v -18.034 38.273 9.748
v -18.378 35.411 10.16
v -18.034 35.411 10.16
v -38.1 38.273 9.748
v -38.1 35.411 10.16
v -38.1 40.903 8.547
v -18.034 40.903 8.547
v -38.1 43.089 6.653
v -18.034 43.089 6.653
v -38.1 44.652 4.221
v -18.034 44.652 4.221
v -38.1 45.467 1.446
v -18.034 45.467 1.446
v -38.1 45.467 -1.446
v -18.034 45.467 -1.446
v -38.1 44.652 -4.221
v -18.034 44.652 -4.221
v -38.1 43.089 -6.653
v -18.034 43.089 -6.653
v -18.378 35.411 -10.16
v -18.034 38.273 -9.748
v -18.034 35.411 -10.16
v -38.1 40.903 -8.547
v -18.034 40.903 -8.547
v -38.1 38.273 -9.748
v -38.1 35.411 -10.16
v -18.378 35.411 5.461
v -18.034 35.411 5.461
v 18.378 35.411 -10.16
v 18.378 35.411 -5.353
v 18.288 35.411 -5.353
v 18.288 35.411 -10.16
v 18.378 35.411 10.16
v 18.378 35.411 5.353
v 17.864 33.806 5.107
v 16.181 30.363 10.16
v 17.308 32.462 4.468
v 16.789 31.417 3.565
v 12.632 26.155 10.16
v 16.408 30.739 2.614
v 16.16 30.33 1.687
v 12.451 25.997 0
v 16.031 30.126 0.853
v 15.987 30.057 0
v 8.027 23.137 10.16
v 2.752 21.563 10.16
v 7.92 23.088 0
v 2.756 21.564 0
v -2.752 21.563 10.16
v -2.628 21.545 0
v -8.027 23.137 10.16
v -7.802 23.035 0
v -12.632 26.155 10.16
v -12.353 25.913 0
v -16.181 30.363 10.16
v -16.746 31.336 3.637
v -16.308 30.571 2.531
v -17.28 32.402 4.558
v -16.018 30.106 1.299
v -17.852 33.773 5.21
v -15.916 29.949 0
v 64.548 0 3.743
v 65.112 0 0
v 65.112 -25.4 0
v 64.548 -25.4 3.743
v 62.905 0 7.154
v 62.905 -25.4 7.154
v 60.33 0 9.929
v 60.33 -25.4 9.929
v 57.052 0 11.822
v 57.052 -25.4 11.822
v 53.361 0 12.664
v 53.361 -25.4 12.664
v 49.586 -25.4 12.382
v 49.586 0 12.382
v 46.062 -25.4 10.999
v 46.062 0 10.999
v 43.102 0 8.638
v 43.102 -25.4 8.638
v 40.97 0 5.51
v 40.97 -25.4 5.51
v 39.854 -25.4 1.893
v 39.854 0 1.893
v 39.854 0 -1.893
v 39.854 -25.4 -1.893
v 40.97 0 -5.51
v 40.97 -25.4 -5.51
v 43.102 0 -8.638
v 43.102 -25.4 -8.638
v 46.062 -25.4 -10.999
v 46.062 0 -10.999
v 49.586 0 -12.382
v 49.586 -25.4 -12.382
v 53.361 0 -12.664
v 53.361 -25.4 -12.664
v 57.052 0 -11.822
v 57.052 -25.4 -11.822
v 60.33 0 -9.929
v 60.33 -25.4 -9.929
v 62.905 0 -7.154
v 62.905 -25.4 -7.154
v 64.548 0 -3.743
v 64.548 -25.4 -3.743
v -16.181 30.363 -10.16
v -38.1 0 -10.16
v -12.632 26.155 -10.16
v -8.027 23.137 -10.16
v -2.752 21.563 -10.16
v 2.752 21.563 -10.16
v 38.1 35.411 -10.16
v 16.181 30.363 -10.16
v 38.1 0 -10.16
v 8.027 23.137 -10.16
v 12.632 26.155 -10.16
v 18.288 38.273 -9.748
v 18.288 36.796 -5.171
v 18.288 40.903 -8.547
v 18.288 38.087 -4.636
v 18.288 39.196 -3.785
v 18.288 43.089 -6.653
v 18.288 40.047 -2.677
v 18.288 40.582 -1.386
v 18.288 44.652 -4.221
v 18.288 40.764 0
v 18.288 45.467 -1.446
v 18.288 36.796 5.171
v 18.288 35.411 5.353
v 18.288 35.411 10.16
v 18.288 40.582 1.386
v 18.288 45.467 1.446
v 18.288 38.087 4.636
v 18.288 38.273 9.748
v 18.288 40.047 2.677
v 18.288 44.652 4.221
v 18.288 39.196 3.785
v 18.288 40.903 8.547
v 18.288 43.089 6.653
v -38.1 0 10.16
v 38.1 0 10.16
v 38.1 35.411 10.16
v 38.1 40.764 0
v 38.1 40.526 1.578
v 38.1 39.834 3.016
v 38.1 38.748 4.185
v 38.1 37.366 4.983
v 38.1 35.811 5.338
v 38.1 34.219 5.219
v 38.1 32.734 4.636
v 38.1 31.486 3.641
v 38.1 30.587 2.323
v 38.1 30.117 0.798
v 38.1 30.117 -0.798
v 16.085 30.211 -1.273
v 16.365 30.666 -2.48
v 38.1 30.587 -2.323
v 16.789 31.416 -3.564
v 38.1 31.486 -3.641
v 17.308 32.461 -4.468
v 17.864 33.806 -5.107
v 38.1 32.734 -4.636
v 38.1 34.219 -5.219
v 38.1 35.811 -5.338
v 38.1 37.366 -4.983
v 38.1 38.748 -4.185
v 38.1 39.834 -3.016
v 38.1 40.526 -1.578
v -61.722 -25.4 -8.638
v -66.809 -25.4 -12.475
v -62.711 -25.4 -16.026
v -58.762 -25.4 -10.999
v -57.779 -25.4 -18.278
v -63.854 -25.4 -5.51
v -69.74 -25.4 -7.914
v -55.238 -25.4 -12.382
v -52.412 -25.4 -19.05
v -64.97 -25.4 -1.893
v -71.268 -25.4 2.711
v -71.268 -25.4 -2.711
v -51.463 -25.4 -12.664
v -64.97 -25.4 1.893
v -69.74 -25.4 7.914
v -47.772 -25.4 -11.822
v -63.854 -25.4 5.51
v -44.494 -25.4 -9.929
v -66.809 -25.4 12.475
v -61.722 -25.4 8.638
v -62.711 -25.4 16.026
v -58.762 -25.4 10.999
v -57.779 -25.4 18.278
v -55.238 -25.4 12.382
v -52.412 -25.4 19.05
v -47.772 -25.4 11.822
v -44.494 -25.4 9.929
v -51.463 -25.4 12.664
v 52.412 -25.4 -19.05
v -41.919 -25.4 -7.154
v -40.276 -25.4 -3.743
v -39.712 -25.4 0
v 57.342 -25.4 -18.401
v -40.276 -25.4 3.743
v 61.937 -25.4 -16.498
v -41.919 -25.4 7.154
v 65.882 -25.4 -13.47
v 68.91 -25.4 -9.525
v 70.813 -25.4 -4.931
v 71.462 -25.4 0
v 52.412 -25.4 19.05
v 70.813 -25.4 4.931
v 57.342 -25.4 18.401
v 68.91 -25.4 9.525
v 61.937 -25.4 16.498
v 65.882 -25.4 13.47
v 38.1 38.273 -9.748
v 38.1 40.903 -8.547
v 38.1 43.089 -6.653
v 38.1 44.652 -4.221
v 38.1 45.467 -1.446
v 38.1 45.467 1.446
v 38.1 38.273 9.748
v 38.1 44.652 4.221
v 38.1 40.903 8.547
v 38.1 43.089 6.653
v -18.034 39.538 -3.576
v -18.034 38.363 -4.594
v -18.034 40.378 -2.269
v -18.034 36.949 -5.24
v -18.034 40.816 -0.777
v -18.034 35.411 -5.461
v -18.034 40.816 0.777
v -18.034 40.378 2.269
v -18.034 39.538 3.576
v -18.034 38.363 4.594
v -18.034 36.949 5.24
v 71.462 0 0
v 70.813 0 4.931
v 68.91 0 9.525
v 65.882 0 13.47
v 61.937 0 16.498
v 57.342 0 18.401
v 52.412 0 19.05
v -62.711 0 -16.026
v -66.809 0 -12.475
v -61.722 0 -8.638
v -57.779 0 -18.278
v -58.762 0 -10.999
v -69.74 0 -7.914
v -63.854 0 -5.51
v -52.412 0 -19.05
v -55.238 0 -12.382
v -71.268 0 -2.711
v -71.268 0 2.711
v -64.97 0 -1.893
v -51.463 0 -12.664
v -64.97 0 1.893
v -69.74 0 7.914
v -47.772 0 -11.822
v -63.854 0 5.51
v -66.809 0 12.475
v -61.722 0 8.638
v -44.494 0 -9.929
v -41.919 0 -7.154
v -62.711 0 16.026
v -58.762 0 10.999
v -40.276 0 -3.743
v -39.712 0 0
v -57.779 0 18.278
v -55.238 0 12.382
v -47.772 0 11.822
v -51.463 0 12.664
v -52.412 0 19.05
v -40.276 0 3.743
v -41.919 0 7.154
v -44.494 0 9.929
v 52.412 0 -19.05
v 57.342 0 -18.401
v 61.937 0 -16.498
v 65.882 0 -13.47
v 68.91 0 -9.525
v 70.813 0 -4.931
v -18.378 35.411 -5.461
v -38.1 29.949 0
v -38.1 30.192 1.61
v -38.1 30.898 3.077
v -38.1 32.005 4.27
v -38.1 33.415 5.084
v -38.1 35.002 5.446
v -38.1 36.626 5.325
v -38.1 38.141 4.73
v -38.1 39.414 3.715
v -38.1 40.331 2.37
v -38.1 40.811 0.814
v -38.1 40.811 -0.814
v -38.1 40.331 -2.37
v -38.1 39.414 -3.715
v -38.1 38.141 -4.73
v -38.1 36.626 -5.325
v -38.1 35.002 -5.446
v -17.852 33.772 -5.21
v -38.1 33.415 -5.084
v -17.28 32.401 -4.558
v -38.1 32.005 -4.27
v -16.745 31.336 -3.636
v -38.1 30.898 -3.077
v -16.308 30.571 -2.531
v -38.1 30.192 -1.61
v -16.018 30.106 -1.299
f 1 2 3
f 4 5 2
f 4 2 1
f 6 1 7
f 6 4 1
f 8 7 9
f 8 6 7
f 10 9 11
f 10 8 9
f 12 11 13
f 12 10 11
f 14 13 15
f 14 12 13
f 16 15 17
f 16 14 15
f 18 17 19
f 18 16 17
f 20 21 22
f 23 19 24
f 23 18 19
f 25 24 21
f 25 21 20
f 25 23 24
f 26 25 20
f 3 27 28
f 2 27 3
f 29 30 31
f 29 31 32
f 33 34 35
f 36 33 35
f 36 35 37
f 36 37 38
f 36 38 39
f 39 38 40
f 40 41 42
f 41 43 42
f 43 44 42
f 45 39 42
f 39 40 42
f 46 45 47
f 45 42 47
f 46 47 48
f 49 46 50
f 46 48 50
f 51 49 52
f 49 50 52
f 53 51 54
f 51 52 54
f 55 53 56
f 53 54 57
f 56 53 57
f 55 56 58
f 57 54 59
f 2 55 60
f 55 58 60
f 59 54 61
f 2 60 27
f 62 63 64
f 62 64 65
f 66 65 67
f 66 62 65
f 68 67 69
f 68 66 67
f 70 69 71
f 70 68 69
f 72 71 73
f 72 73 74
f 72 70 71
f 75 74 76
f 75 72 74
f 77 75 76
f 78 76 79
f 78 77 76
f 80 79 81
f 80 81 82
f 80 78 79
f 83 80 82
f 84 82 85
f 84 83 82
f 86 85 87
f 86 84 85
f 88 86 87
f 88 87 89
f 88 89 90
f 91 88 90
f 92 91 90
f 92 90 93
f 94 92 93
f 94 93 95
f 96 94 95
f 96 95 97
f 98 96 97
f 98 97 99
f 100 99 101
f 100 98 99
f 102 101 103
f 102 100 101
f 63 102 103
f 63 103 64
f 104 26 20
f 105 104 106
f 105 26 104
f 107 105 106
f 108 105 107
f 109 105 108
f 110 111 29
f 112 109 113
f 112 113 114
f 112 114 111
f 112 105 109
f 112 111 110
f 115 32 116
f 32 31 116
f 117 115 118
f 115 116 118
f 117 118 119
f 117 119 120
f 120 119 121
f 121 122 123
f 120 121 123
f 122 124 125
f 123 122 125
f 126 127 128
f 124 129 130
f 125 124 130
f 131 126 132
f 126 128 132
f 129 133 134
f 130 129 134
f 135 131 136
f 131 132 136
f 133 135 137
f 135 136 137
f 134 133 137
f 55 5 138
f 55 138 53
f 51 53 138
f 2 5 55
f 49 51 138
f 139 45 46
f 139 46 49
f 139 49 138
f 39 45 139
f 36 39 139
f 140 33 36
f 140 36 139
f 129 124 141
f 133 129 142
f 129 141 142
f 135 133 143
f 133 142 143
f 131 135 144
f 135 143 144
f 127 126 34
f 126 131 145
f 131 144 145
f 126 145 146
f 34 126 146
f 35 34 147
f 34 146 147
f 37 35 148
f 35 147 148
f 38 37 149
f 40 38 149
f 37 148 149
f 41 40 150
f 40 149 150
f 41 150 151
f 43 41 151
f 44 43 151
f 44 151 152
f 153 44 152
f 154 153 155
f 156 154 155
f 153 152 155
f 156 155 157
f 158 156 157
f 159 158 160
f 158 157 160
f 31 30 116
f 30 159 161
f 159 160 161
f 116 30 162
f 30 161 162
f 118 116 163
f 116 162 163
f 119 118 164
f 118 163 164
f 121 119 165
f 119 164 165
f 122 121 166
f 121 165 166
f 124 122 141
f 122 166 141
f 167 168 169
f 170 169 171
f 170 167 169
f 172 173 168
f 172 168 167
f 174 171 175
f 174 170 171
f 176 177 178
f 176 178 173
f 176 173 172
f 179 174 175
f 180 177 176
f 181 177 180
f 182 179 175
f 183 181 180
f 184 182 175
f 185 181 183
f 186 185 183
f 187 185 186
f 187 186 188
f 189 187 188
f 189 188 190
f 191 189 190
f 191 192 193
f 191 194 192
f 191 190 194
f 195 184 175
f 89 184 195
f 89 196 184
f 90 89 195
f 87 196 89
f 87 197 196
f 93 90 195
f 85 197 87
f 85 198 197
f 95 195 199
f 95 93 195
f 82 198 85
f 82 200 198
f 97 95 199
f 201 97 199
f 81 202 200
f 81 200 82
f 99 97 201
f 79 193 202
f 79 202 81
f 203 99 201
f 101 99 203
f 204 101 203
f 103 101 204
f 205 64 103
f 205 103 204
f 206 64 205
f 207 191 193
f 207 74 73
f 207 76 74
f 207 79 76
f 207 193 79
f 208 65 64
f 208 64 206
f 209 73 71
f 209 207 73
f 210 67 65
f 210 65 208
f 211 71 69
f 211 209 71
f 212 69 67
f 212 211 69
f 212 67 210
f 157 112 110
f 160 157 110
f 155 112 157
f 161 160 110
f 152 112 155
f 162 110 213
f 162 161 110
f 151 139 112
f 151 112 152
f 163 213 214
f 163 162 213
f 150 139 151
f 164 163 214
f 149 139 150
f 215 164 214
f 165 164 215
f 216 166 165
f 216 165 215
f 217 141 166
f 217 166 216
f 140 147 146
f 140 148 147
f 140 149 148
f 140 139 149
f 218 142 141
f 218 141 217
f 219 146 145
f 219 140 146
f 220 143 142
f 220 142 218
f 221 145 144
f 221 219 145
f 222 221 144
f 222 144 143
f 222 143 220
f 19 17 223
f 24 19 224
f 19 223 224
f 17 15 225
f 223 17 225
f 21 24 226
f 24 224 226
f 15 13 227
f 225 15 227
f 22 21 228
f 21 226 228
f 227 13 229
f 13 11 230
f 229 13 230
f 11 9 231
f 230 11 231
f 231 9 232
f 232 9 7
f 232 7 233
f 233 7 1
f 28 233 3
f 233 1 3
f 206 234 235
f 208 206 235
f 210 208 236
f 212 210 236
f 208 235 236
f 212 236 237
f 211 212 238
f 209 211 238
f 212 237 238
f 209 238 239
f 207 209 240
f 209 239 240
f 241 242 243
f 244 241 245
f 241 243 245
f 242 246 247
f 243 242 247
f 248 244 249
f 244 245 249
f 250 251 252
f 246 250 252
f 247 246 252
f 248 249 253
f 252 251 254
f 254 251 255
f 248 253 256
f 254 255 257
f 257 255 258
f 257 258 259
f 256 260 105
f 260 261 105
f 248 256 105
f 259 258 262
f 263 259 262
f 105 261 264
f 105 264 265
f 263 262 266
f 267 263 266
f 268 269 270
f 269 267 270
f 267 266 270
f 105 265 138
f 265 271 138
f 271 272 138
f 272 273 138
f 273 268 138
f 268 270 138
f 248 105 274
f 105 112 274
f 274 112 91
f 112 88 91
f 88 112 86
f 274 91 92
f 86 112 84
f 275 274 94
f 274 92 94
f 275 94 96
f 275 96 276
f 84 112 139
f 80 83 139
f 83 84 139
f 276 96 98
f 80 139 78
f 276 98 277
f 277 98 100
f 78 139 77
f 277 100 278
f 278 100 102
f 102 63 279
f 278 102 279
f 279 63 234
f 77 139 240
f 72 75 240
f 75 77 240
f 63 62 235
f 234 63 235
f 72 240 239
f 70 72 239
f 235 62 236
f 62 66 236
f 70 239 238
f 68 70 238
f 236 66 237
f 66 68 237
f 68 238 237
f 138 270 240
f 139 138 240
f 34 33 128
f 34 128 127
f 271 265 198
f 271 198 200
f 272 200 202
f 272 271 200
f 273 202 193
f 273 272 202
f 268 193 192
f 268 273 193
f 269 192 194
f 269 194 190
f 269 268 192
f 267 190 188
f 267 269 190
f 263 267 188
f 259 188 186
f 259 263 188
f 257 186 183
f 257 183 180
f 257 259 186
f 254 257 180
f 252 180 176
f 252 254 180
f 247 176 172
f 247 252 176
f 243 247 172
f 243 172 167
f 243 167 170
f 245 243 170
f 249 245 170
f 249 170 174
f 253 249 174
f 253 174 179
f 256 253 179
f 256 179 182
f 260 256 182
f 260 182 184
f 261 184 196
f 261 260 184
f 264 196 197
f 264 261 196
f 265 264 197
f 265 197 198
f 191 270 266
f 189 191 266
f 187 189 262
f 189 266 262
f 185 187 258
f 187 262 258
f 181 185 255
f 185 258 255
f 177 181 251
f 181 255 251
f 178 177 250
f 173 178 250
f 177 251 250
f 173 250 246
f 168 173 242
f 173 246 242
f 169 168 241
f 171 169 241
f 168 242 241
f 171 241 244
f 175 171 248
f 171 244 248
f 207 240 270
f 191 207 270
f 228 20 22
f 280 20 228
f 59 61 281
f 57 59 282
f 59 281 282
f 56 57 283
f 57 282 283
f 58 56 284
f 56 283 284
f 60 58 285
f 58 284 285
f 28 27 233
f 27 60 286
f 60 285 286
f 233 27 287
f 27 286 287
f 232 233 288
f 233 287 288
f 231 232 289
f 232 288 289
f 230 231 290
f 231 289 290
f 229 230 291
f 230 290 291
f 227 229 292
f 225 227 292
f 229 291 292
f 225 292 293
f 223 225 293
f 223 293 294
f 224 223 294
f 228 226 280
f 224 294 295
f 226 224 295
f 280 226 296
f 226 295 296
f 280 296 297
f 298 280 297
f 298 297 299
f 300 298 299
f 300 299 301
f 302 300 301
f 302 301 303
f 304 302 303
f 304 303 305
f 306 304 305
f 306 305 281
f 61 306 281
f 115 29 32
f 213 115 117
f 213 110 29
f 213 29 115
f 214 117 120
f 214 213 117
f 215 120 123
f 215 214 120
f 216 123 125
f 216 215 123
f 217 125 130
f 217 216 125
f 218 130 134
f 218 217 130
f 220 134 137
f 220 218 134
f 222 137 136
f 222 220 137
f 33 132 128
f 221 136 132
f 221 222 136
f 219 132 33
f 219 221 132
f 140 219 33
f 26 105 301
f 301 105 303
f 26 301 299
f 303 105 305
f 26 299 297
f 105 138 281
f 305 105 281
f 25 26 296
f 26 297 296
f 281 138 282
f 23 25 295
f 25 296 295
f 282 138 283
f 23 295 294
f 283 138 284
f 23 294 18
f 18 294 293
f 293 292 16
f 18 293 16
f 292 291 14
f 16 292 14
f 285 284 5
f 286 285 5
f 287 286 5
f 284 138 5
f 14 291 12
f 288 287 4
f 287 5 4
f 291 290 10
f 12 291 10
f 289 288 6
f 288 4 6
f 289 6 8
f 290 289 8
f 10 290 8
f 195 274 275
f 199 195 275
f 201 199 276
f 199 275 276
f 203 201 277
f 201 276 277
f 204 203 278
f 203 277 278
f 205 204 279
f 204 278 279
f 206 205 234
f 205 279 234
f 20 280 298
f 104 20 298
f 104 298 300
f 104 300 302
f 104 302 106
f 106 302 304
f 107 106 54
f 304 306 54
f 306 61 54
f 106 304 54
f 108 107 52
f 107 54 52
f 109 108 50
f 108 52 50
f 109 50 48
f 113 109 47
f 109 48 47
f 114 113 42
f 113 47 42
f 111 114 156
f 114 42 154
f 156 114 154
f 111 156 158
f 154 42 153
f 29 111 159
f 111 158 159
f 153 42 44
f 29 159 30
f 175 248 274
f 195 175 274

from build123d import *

# Parameters (mm, degrees)
F0_R      = 12.7
F1_DEPTH  = 25.4
F3_DEPTH  = 10.16
F4_DEPTH  = 10.16
F6_DEPTH  = 20.066
F8_DEPTH  = 19.812
F9_R      = 5.46143
F11_DEPTH = 25.4
F10_R     = 5.353375
F12_DEPTH = 25.4


with BuildPart() as f1:
    # F0 (on Front) → F1 (new body)
    with BuildSketch(Plane.XZ):
        with BuildLine():
            ThreePointArc((-52.411983, 19.05), (-38.941599, 13.470384), (-33.361983, 0))
            ThreePointArc((-33.361983, 0), (-38.941599, -13.470384), (-52.411983, -19.05))
            Line((-52.411983, -19.05), (52.411983, -19.05))
            ThreePointArc((52.411983, -19.05), (33.361983, 0), (52.411983, 19.05))
            Line((52.411983, 19.05), (-52.411983, 19.05))
        make_face()
        with BuildLine():
            ThreePointArc((-52.411983, -19.05), (-38.941599, -13.470384), (-33.361983, 0))
            ThreePointArc((-33.361983, 0), (-38.941599, 13.470384), (-52.411983, 19.05))
            ThreePointArc((-52.411983, 19.05), (-71.461983, 0), (-52.411983, -19.05))
        make_face()
        with Locations((-52.411983, 0)):
            Circle(F0_R, mode=Mode.SUBTRACT)
        with BuildLine():
            ThreePointArc((71.461983, 0), (65.882367, 13.470384), (52.411983, 19.05))
            ThreePointArc((52.411983, 19.05), (33.361983, 0), (52.411983, -19.05))
            ThreePointArc((52.411983, -19.05), (65.882367, -13.470384), (71.461983, 0))
        make_face()
        with Locations((52.411983, 0)):
            Circle(F0_R, mode=Mode.SUBTRACT)
    extrude(amount=F1_DEPTH)

    # F2 (on Top) → F3 (join)
    with BuildSketch(Plane.XY):
        with BuildLine():
            Line((-38.1, 0), (0, 0))
            Line((0, 0), (38.1, 0))
            Line((38.1, 0), (38.1, 35.410588))
            Line((38.1, 35.410588), (18.377647, 35.410588))
            ThreePointArc((18.377647, 35.410588), (0, 21.363075), (-18.377647, 35.410588))
            Line((-18.377647, 35.410588), (-38.1, 35.410588))
            Line((-38.1, 35.410588), (-38.1, 0))
        make_face()
    extrude(amount=F3_DEPTH)

    # F3_face (on face) → F4 (join)
    with BuildSketch(Plane(origin=(0, 15.751851, 0), x_dir=(1, 0, 0), z_dir=(0, 0, -1))):
        with BuildLine():
            Line((38.1, 15.751851), (-38.1, 15.751851))
            Line((-38.1, 15.751851), (-38.1, -19.658738))
            Line((-38.1, -19.658738), (-18.377647, -19.658738))
            ThreePointArc((-18.377647, -19.658738), (0, -5.611224), (18.377647, -19.658738))
            Line((18.377647, -19.658738), (38.1, -19.658738))
            Line((38.1, -19.658738), (38.1, 15.751851))
        make_face()
    extrude(amount=F4_DEPTH)

    # F5 (on face) → F6 (join)
    with BuildSketch(Plane(origin=(-38.1, 0, 0), x_dir=(0, -1, 0), z_dir=(-1, 0, 0))):
        with BuildLine():
            Line((-35.410588, -10.16), (-35.410588, 10.16))
            ThreePointArc((-35.410588, 10.16), (-45.570588, 0), (-35.410588, -10.16))
        make_face()
    extrude(amount=-F6_DEPTH)

    # F7 (on face) → F8 (join)
    with BuildSketch(Plane.YZ.offset(38.1)):
        with BuildLine():
            Line((35.410588, 10.16), (35.410588, -10.16))
            ThreePointArc((35.410588, -10.16), (45.570588, 0), (35.410588, 10.16))
        make_face()
    extrude(amount=-F8_DEPTH)

    # F9 (on face) → F11 (cut)
    with BuildSketch(Plane(origin=(-38.1, 0, 0), x_dir=(0, -1, 0), z_dir=(-1, 0, 0))):
        with Locations((-35.410588, 0)):
            Circle(F9_R)
    extrude(amount=-F11_DEPTH, mode=Mode.SUBTRACT)

    # F10 (on face) → F12 (cut)
    with BuildSketch(Plane.YZ.offset(38.1)):
        with Locations((35.410588, 0)):
            Circle(F10_R)
    extrude(amount=-F12_DEPTH, mode=Mode.SUBTRACT)


solid = f1.part
